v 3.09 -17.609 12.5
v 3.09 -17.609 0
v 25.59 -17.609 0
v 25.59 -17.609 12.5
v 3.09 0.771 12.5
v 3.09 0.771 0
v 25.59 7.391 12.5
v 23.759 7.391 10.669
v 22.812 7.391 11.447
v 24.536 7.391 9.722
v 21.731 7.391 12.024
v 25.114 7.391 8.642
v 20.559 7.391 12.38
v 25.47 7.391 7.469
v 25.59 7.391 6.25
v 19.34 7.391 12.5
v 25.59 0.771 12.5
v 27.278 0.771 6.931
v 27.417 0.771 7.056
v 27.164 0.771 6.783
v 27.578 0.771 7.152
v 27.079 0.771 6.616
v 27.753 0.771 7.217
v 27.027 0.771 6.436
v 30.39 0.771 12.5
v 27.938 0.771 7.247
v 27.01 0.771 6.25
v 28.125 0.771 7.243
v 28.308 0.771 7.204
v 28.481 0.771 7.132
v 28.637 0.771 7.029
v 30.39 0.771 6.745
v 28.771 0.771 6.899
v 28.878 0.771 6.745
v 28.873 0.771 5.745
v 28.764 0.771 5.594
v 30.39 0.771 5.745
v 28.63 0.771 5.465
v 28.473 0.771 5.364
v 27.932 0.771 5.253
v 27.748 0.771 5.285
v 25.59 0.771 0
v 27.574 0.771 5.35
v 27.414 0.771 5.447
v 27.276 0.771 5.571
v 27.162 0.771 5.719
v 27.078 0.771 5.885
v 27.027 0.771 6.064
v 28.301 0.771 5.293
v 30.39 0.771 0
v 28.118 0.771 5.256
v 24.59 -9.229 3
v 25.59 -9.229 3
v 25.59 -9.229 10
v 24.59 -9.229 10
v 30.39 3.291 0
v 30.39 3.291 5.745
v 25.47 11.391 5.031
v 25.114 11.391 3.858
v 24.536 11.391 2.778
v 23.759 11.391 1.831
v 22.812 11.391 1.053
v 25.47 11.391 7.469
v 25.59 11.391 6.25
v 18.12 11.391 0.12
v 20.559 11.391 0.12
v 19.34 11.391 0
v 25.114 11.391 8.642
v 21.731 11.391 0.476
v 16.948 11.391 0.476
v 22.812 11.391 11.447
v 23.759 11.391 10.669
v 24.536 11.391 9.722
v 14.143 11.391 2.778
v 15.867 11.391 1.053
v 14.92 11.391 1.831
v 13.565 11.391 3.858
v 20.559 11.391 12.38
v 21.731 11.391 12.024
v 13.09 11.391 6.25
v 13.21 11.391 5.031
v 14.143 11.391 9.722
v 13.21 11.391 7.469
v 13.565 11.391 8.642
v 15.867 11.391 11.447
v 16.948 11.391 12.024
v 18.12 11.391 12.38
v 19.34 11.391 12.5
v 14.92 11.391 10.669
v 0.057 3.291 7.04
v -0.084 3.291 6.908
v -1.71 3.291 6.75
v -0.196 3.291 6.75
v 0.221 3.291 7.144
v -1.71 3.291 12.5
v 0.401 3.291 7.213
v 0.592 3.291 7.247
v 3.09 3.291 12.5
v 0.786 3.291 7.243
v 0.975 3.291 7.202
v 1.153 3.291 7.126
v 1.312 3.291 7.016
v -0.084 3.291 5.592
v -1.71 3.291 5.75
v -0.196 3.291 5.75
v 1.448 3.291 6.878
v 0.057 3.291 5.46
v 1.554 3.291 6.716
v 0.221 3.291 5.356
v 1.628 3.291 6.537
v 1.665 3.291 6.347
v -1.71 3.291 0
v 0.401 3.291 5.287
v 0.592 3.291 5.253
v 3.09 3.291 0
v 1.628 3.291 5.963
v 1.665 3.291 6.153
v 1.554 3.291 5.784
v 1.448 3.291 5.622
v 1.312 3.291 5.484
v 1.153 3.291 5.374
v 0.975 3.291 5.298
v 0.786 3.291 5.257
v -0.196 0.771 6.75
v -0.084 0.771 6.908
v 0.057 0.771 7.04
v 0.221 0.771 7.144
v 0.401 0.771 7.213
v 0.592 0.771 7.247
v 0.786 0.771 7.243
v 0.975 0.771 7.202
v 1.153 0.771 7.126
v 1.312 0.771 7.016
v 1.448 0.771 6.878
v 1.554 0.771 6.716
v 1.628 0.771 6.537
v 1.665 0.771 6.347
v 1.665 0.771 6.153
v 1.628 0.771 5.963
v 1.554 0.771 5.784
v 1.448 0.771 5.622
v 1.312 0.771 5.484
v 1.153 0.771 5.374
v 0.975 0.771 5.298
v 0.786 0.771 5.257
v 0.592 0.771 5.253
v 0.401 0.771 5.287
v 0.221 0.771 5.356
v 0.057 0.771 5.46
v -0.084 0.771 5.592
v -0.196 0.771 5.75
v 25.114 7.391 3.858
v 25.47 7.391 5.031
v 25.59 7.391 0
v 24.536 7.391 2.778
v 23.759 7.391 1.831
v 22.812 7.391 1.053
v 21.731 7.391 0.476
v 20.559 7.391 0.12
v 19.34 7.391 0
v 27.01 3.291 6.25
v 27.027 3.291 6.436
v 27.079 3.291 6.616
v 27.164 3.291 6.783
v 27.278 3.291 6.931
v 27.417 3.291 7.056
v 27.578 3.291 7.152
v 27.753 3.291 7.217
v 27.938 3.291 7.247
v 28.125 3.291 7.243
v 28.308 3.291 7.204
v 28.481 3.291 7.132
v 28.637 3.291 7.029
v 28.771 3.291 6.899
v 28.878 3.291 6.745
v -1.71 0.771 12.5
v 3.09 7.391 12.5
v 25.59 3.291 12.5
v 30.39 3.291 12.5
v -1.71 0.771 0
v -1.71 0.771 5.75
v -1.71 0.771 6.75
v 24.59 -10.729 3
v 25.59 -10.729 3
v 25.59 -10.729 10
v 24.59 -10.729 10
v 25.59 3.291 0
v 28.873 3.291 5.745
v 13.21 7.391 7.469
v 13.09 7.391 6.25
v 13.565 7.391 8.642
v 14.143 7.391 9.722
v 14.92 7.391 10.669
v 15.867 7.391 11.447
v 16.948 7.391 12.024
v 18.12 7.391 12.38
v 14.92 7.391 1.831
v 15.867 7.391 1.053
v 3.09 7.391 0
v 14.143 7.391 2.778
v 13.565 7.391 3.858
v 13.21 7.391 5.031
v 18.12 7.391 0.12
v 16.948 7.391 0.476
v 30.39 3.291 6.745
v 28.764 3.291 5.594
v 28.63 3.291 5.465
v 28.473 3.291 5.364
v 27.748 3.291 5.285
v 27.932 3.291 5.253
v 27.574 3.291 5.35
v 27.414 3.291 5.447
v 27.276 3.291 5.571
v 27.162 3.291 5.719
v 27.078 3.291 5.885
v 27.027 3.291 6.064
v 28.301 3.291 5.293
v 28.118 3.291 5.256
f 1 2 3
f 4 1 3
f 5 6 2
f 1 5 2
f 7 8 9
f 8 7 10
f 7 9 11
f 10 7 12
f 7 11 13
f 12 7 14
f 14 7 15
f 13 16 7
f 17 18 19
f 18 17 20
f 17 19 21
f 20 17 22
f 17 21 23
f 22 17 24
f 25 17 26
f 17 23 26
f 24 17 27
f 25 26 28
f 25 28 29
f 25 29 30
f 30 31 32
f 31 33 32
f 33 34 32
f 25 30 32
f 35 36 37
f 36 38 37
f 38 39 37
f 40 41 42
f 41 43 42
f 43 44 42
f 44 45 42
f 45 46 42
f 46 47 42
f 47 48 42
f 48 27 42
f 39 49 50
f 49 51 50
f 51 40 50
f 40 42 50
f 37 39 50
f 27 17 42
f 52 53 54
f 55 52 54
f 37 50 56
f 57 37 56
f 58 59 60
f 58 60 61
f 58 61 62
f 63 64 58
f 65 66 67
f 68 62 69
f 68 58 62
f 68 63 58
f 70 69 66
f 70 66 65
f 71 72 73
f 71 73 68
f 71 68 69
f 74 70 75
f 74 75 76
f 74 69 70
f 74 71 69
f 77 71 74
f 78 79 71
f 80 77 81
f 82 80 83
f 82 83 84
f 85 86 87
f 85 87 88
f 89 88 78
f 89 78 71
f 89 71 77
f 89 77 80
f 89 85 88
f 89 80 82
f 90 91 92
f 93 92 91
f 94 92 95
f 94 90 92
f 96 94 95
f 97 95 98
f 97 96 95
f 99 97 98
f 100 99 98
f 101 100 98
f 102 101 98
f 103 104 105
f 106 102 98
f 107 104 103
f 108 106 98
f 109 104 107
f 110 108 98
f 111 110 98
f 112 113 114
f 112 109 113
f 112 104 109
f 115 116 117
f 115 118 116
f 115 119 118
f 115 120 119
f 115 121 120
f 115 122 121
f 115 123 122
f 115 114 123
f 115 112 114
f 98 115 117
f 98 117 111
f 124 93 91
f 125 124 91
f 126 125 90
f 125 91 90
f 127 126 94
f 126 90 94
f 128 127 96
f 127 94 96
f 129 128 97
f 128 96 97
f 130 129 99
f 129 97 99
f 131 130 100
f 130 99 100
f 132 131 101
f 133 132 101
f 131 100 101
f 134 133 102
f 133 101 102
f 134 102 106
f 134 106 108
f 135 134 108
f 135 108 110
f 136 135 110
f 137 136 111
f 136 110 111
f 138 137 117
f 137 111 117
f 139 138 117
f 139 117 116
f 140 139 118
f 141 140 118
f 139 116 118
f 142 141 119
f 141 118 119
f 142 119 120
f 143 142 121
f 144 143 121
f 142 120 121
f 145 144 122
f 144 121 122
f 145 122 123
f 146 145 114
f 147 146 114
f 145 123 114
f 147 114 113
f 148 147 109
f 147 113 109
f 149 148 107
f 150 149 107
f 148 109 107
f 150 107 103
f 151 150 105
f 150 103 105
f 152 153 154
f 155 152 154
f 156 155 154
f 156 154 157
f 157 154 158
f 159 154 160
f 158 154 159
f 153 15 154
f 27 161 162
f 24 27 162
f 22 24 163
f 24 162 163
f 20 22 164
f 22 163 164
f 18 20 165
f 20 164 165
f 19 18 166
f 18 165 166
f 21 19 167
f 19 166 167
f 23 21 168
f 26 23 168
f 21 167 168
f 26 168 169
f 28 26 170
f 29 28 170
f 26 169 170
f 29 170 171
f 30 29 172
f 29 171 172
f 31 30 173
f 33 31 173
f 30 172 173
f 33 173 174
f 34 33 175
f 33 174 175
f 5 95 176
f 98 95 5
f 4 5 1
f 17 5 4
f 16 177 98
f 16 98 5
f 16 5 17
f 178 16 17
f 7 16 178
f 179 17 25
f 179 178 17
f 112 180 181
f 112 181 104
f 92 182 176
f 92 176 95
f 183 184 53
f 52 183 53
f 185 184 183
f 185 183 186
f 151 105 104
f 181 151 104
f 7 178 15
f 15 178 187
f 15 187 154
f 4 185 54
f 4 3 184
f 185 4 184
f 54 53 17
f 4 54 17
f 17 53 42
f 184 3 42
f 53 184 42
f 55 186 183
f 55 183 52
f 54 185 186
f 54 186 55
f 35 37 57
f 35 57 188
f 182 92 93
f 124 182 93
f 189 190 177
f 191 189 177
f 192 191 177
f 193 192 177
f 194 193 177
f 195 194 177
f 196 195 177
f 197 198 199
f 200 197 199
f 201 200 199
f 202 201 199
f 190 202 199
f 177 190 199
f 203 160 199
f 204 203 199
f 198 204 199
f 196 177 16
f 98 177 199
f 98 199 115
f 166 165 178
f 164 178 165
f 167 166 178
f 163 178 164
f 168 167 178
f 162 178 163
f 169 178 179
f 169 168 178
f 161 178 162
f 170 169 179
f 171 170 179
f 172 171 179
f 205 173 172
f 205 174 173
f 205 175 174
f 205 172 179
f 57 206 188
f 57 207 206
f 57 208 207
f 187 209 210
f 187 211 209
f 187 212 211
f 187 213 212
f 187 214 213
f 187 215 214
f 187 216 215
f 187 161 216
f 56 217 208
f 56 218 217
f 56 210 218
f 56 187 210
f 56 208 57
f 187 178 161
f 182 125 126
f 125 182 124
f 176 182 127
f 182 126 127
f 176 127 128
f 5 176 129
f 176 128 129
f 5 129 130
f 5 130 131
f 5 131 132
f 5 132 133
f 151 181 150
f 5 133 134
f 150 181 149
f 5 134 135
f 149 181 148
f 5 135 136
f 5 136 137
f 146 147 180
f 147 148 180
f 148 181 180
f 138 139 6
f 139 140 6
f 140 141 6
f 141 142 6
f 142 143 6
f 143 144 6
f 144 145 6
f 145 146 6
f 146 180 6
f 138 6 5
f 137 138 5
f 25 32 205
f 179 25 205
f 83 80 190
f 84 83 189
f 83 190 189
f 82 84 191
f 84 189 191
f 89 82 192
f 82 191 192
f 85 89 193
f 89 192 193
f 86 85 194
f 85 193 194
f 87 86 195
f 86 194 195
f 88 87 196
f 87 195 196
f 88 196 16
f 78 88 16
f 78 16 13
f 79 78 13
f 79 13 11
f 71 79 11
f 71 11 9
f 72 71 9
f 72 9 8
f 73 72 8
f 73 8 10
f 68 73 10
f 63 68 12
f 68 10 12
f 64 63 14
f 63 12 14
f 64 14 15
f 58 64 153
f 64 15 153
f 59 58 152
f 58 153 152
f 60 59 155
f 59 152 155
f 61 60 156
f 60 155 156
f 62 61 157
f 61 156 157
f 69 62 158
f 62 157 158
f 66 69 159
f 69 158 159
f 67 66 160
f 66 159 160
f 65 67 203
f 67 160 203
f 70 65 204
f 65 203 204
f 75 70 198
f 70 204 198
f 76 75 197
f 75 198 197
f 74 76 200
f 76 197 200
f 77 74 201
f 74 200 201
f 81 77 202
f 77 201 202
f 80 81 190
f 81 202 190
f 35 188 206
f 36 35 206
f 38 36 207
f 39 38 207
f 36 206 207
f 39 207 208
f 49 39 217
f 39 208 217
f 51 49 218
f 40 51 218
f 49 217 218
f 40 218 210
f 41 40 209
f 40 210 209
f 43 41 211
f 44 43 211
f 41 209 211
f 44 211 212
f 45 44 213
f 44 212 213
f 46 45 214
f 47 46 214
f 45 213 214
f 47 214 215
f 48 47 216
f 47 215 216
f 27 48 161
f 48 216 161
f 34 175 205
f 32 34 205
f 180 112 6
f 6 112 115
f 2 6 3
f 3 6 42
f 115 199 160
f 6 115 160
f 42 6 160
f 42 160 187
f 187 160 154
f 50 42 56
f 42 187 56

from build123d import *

# Parameters (mm, degrees)
F0_W     = 4.8
F0_H     = 2.52
F1_DEPTH = 12.5
F2_W     = 1.5
F2_H     = 7
F3_DEPTH = 1
F4_R     = 6.25
F5_DEPTH = 4
F7_DEPTH = 2.52
F9_DEPTH = 2.52


with BuildPart() as f1:
    # F0 (on Top) → F1 (new body)
    with BuildSketch(Plane.XY):
        Polygon((25.5896202285, 7.390901965), (3.0896202285, 7.390901965), (3.0896202285, 3.290901965), (3.0896202285, 0.770901965), (3.0896202285, -17.609098035), (25.5896202285, -17.609098035), (25.5896202285, 0.770901965), (25.5896202285, 3.290901965), align=None)
        with Locations((27.9896202285, 2.030901965)):
            Rectangle(F0_W, F0_H)
        with Locations((0.6896202285, 2.030901965)):
            Rectangle(F0_W, F0_H)
    extrude(amount=F1_DEPTH)

    # F2 (on face) → F3 (cut)
    with BuildSketch(Plane.YZ.offset(25.5896202285)):
        with Locations((-9.979098035, 6.5)):
            Rectangle(F2_W, F2_H)
    extrude(amount=-F3_DEPTH, mode=Mode.SUBTRACT)

    # F4 (on face) → F5 (join)
    with BuildSketch(Plane(origin=(0, 7.390901965, 0), x_dir=(-1, 0, 0), z_dir=(0, 1, 0))):
        with Locations((-19.3396202285, 6.25)):
            Circle(F4_R)
    extrude(amount=F5_DEPTH)

    # F6 (on face) → F7 (cut, through all)
    with BuildSketch(Plane(origin=(0, 3.290901965, 0), x_dir=(-1, 0, 0), z_dir=(0, 1, 0))):
        with BuildLine():
            Line((-30.3896202285, 5.7453945725), (-28.8729703096, 5.7453945725))
            ThreePointArc((-28.8729703096, 5.7453945725), (-29.0096060883, 6.2446820853), (-28.8782882995, 6.7453945725))
            Line((-28.8782882995, 6.7453945725), (-30.3896202285, 6.7453945725))
            Line((-30.3896202285, 6.7453945725), (-30.3896202285, 5.7453945725))
        make_face()
        with BuildLine():
            Line((-28.8729703096, 6.7453945725), (-28.8729703096, 5.7453945725))
            ThreePointArc((-28.8729703096, 5.7453945725), (-27.7482297936, 5.2847668465), (-27.0096202285, 6.25))
            ThreePointArc((-27.0096202285, 6.25), (-27.7533665173, 7.2166095569), (-28.8782882995, 6.7453945725))
            Line((-28.8782882995, 6.7453945725), (-28.8729703096, 6.7453945725))
        make_face()
        with BuildLine():
            ThreePointArc((-28.8782882995, 6.7453945725), (-29.0096060883, 6.2446820853), (-28.8729703096, 5.7453945725))
            Line((-28.8729703096, 5.7453945725), (-28.8729703096, 6.7453945725))
            Line((-28.8729703096, 6.7453945725), (-28.8782882995, 6.7453945725))
        make_face()
    extrude(amount=-F7_DEPTH, mode=Mode.SUBTRACT)

    # F8 (on face) → F9 (cut, through all)
    with BuildSketch(Plane(origin=(0, 3.290901965, 0), x_dir=(-1, 0, 0), z_dir=(0, 1, 0))):
        with BuildLine():
            ThreePointArc((0.1964051753, 5.75), (0.2963055978, 5.9911809549), (0.3303797715, 6.25))
            ThreePointArc((0.3303797715, 6.25), (0.2963055978, 6.5088190451), (0.1964051753, 6.75))
            Line((0.1964051753, 6.75), (-0.2896202285, 6.75))
            Line((-0.2896202285, 6.75), (-0.2896202285, 5.75))
            Line((-0.2896202285, 5.75), (0.1964051753, 5.75))
        make_face()
        with BuildLine():
            ThreePointArc((0.1964051753, 6.75), (0.2963055978, 6.5088190451), (0.3303797715, 6.25))
            ThreePointArc((0.3303797715, 6.25), (0.2963055978, 5.9911809549), (0.1964051753, 5.75))
            Line((0.1964051753, 5.75), (1.7103797715, 5.75))
            Line((1.7103797715, 5.75), (1.7103797715, 6.75))
            Line((1.7103797715, 6.75), (0.1964051753, 6.75))
        make_face()
        with BuildLine():
            Line((-0.2896202285, 6.75), (0.1964051753, 6.75))
            ThreePointArc((0.1964051753, 6.75), (-1.6696202285, 6.25), (0.1964051753, 5.75))
            Line((0.1964051753, 5.75), (-0.2896202285, 5.75))
            Line((-0.2896202285, 5.75), (-0.2896202285, 6.75))
        make_face()
    extrude(amount=-F9_DEPTH, mode=Mode.SUBTRACT)


solid = f1.part
